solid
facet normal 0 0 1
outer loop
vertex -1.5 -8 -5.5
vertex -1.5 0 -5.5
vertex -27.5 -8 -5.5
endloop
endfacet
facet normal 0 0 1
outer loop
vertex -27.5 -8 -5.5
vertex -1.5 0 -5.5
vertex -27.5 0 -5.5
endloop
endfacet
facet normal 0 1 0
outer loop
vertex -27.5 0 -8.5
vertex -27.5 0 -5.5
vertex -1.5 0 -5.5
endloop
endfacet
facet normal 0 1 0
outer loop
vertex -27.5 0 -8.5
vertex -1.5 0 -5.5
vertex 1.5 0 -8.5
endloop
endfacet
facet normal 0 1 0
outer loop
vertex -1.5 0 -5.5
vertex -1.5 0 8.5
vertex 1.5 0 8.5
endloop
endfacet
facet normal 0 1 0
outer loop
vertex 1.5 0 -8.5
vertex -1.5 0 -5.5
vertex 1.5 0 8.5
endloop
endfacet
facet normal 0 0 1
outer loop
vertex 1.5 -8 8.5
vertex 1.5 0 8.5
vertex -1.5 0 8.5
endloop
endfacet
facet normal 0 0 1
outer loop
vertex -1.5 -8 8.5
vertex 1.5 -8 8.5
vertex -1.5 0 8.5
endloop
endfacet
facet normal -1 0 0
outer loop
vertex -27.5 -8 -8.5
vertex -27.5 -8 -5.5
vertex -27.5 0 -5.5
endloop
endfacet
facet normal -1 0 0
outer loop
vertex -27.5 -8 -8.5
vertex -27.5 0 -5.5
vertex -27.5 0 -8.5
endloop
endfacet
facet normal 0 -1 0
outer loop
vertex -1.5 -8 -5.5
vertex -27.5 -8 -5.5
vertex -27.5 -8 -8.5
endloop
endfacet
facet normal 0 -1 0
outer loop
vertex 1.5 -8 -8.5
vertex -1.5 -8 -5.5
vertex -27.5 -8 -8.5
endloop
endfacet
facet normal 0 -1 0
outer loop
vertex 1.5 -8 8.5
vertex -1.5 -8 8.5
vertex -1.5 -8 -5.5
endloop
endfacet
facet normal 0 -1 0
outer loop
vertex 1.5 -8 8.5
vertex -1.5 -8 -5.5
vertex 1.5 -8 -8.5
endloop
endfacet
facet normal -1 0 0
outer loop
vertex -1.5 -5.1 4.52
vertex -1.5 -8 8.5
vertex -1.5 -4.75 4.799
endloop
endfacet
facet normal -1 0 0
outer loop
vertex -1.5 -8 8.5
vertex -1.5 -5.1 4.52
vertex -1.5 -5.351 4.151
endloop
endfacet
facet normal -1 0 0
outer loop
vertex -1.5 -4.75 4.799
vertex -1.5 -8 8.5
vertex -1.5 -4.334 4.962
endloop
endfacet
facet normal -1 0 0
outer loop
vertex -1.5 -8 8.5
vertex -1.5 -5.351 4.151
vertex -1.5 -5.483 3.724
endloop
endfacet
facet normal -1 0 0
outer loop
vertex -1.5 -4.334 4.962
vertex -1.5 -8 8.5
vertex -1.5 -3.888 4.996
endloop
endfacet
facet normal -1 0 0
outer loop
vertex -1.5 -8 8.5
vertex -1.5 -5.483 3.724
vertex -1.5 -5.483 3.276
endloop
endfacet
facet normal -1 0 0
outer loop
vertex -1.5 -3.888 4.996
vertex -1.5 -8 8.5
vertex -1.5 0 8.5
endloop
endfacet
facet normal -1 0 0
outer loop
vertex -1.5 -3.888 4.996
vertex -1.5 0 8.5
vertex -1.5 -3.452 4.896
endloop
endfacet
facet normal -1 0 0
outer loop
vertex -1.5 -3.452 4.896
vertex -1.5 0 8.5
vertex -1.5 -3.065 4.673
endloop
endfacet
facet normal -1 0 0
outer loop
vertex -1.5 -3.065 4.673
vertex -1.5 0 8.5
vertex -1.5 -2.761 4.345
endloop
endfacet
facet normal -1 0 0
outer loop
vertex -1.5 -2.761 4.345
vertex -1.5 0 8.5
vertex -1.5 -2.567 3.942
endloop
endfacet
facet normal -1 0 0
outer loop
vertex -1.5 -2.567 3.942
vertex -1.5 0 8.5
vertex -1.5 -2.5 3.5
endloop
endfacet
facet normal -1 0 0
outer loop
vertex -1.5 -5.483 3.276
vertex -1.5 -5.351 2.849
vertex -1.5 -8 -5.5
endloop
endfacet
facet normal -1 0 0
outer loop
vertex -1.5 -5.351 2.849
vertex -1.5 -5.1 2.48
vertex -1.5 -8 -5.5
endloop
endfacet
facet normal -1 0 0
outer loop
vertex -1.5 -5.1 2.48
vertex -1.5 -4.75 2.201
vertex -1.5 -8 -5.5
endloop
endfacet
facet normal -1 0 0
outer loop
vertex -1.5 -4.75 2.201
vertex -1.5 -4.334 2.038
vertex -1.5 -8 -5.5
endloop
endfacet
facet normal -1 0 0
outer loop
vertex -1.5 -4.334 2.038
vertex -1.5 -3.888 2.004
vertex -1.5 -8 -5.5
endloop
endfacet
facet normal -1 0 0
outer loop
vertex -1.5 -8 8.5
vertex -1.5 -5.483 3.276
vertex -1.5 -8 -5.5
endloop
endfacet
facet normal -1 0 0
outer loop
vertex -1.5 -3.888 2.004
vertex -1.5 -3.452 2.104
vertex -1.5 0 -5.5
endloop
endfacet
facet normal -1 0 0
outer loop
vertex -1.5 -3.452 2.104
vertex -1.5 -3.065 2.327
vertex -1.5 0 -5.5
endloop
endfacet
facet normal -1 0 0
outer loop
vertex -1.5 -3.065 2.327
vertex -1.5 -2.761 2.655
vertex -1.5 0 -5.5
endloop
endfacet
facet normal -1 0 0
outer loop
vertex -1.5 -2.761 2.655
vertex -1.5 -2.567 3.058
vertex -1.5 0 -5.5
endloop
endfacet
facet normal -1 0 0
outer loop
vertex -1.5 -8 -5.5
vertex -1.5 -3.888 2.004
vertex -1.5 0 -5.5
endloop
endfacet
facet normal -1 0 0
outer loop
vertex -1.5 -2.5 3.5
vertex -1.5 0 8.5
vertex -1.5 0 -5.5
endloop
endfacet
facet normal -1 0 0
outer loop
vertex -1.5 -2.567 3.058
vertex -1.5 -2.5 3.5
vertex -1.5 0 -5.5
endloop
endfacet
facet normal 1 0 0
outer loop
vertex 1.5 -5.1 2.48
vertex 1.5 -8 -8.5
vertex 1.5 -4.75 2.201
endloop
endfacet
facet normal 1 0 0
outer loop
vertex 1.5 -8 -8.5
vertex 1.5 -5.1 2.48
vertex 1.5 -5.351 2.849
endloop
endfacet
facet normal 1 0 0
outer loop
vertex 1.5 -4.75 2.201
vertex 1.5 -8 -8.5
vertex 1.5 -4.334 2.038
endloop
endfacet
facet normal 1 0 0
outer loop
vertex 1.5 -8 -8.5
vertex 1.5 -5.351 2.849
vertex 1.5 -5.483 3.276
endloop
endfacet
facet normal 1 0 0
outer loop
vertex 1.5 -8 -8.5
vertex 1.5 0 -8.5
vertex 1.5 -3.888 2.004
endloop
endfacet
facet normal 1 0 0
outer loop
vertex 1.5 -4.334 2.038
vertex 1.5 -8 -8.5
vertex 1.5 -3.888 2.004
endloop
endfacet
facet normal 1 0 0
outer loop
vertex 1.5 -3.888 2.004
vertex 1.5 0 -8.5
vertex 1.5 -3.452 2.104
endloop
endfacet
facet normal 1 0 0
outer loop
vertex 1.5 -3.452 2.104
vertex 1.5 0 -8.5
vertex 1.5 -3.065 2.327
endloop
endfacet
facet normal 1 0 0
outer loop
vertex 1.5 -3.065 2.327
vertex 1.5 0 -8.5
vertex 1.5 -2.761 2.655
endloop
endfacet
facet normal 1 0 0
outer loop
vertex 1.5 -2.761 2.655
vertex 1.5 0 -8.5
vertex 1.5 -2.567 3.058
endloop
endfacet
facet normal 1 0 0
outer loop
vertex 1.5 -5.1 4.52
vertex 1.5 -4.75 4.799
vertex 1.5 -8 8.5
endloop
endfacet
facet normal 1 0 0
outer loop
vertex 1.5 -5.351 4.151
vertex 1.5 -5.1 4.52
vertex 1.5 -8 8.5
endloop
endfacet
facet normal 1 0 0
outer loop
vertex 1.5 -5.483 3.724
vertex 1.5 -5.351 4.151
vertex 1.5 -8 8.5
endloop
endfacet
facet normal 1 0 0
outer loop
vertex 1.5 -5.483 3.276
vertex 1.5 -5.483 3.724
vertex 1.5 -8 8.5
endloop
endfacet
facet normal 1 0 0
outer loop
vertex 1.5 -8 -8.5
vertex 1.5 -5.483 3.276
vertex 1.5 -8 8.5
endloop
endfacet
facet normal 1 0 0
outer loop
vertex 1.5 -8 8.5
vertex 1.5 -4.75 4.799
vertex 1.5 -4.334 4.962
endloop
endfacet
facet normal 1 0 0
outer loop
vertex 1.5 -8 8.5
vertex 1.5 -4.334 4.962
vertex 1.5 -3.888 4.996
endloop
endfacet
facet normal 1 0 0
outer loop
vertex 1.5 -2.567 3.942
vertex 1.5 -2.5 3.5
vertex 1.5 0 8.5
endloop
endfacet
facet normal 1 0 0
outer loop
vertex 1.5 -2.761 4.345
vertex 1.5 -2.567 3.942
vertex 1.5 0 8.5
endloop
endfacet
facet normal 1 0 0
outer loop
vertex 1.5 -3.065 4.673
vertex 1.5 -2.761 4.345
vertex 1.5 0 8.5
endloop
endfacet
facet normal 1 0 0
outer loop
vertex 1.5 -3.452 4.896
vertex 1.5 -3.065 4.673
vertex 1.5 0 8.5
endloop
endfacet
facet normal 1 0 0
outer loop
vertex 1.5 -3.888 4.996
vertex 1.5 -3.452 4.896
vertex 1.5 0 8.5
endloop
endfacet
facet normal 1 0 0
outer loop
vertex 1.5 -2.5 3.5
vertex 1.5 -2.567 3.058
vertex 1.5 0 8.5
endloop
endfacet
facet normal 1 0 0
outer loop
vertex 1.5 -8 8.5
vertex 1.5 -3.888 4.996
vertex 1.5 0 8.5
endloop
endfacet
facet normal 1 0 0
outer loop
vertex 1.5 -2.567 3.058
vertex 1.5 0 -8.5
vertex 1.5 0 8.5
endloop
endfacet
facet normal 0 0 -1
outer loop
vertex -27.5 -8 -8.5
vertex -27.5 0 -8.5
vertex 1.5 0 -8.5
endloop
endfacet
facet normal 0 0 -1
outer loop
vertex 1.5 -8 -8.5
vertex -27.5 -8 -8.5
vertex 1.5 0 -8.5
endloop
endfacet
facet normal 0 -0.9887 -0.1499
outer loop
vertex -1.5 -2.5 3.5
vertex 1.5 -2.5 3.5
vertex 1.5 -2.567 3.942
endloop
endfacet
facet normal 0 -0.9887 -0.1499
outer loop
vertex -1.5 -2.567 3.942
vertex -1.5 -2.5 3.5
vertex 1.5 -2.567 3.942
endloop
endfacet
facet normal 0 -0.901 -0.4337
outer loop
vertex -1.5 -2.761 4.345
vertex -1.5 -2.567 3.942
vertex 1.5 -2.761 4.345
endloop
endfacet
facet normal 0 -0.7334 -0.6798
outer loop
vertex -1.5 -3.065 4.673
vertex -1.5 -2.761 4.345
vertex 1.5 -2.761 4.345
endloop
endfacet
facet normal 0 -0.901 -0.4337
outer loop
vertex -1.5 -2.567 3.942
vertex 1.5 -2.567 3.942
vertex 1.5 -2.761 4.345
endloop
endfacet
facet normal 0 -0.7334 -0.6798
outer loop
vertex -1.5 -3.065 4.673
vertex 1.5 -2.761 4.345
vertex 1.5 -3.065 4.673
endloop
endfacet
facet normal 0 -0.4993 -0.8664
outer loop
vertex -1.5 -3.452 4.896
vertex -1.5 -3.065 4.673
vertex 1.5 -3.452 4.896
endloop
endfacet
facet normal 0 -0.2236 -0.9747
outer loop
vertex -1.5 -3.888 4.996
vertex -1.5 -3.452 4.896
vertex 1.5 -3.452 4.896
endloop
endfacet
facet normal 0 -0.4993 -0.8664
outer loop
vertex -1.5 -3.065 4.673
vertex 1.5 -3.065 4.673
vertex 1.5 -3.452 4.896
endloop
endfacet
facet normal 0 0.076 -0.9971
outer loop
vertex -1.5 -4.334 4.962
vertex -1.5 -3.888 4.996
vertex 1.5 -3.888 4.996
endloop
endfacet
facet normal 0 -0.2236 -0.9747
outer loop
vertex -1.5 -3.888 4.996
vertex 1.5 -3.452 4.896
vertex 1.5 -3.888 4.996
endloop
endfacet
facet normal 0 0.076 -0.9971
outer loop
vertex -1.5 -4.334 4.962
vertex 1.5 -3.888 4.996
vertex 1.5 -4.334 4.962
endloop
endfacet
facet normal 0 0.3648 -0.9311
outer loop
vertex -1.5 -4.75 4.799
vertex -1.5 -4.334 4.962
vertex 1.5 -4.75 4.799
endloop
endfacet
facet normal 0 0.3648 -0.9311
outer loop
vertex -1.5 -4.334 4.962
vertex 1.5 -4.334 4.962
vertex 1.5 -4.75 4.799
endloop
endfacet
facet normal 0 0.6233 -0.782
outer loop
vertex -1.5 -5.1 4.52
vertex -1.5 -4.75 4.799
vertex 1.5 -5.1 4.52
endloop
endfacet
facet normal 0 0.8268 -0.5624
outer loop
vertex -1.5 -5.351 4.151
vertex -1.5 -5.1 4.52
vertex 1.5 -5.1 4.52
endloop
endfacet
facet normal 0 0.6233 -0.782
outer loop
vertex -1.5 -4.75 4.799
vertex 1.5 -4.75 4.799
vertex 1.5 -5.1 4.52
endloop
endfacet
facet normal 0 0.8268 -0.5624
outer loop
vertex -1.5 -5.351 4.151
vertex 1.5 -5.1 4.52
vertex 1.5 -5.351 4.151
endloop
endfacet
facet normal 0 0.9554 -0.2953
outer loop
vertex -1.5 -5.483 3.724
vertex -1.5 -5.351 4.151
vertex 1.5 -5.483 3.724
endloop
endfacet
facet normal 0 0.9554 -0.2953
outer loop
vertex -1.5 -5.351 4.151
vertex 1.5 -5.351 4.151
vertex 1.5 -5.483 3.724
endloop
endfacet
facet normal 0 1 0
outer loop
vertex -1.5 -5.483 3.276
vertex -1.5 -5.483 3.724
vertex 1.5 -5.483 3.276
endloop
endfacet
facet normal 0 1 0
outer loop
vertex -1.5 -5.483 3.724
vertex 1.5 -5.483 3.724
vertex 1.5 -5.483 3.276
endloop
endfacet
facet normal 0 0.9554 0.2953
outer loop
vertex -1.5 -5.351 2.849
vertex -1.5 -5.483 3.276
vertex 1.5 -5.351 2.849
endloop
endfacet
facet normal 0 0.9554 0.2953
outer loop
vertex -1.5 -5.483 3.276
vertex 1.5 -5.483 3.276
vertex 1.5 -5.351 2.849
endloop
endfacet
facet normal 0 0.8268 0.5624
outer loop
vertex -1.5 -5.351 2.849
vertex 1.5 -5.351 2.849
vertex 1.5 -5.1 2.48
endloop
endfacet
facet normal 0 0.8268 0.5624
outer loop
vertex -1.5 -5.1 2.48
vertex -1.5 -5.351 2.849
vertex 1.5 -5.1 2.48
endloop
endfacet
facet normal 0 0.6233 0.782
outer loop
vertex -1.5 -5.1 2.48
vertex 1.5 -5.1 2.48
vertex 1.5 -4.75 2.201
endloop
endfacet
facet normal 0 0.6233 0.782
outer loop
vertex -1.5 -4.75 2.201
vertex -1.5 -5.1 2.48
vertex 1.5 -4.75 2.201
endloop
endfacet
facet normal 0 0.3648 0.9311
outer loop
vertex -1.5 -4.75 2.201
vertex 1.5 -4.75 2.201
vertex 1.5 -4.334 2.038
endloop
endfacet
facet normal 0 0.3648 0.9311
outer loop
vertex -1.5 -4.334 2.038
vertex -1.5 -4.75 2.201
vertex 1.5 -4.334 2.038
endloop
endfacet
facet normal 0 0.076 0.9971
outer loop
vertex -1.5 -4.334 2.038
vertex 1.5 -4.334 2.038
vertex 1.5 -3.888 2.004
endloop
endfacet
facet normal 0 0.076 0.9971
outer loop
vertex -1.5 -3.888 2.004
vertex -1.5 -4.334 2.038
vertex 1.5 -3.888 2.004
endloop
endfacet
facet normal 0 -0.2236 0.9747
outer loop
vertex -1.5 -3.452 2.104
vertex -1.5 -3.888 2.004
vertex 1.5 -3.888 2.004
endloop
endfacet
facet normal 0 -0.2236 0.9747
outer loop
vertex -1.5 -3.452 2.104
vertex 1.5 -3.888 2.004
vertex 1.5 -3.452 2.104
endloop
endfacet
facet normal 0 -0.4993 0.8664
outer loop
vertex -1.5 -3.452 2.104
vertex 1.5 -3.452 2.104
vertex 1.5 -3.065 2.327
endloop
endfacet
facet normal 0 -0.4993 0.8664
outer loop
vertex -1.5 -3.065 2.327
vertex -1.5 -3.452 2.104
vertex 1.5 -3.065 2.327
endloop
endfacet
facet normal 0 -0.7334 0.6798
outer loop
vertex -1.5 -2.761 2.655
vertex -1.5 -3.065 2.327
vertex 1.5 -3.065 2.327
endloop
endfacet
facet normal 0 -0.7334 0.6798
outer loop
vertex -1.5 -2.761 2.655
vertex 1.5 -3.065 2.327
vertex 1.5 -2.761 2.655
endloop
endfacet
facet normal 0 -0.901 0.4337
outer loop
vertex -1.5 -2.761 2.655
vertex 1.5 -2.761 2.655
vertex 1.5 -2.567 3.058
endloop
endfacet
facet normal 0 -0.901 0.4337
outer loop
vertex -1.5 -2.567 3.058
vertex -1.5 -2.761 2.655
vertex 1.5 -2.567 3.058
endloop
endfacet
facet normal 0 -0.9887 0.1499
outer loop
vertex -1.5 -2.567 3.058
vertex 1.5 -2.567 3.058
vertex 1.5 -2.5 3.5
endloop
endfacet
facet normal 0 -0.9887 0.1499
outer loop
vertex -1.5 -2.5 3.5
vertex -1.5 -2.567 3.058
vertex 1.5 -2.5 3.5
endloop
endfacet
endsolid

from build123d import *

# Parameters (mm, degrees)
F1_DEPTH = 8
F2_R     = 1.5
F3_DEPTH = 25


with BuildPart() as f1:
    # F0 (on Front) → F1 (new body)
    with BuildSketch(Plane.XZ):
        Polygon((1.5, 8.5), (-1.5, 8.5), (-1.5, -5.5), (-27.5, -5.5), (-27.5, -8.5), (-1.5, -8.5), (1.5, -8.5), align=None)
    extrude(amount=F1_DEPTH)

    # F2 (on face) → F3 (cut)
    with BuildSketch(Plane.YZ.offset(1.5)):
        with Locations((-4, 3.5)):
            Circle(F2_R)
    extrude(amount=-F3_DEPTH, mode=Mode.SUBTRACT)


solid = f1.part
